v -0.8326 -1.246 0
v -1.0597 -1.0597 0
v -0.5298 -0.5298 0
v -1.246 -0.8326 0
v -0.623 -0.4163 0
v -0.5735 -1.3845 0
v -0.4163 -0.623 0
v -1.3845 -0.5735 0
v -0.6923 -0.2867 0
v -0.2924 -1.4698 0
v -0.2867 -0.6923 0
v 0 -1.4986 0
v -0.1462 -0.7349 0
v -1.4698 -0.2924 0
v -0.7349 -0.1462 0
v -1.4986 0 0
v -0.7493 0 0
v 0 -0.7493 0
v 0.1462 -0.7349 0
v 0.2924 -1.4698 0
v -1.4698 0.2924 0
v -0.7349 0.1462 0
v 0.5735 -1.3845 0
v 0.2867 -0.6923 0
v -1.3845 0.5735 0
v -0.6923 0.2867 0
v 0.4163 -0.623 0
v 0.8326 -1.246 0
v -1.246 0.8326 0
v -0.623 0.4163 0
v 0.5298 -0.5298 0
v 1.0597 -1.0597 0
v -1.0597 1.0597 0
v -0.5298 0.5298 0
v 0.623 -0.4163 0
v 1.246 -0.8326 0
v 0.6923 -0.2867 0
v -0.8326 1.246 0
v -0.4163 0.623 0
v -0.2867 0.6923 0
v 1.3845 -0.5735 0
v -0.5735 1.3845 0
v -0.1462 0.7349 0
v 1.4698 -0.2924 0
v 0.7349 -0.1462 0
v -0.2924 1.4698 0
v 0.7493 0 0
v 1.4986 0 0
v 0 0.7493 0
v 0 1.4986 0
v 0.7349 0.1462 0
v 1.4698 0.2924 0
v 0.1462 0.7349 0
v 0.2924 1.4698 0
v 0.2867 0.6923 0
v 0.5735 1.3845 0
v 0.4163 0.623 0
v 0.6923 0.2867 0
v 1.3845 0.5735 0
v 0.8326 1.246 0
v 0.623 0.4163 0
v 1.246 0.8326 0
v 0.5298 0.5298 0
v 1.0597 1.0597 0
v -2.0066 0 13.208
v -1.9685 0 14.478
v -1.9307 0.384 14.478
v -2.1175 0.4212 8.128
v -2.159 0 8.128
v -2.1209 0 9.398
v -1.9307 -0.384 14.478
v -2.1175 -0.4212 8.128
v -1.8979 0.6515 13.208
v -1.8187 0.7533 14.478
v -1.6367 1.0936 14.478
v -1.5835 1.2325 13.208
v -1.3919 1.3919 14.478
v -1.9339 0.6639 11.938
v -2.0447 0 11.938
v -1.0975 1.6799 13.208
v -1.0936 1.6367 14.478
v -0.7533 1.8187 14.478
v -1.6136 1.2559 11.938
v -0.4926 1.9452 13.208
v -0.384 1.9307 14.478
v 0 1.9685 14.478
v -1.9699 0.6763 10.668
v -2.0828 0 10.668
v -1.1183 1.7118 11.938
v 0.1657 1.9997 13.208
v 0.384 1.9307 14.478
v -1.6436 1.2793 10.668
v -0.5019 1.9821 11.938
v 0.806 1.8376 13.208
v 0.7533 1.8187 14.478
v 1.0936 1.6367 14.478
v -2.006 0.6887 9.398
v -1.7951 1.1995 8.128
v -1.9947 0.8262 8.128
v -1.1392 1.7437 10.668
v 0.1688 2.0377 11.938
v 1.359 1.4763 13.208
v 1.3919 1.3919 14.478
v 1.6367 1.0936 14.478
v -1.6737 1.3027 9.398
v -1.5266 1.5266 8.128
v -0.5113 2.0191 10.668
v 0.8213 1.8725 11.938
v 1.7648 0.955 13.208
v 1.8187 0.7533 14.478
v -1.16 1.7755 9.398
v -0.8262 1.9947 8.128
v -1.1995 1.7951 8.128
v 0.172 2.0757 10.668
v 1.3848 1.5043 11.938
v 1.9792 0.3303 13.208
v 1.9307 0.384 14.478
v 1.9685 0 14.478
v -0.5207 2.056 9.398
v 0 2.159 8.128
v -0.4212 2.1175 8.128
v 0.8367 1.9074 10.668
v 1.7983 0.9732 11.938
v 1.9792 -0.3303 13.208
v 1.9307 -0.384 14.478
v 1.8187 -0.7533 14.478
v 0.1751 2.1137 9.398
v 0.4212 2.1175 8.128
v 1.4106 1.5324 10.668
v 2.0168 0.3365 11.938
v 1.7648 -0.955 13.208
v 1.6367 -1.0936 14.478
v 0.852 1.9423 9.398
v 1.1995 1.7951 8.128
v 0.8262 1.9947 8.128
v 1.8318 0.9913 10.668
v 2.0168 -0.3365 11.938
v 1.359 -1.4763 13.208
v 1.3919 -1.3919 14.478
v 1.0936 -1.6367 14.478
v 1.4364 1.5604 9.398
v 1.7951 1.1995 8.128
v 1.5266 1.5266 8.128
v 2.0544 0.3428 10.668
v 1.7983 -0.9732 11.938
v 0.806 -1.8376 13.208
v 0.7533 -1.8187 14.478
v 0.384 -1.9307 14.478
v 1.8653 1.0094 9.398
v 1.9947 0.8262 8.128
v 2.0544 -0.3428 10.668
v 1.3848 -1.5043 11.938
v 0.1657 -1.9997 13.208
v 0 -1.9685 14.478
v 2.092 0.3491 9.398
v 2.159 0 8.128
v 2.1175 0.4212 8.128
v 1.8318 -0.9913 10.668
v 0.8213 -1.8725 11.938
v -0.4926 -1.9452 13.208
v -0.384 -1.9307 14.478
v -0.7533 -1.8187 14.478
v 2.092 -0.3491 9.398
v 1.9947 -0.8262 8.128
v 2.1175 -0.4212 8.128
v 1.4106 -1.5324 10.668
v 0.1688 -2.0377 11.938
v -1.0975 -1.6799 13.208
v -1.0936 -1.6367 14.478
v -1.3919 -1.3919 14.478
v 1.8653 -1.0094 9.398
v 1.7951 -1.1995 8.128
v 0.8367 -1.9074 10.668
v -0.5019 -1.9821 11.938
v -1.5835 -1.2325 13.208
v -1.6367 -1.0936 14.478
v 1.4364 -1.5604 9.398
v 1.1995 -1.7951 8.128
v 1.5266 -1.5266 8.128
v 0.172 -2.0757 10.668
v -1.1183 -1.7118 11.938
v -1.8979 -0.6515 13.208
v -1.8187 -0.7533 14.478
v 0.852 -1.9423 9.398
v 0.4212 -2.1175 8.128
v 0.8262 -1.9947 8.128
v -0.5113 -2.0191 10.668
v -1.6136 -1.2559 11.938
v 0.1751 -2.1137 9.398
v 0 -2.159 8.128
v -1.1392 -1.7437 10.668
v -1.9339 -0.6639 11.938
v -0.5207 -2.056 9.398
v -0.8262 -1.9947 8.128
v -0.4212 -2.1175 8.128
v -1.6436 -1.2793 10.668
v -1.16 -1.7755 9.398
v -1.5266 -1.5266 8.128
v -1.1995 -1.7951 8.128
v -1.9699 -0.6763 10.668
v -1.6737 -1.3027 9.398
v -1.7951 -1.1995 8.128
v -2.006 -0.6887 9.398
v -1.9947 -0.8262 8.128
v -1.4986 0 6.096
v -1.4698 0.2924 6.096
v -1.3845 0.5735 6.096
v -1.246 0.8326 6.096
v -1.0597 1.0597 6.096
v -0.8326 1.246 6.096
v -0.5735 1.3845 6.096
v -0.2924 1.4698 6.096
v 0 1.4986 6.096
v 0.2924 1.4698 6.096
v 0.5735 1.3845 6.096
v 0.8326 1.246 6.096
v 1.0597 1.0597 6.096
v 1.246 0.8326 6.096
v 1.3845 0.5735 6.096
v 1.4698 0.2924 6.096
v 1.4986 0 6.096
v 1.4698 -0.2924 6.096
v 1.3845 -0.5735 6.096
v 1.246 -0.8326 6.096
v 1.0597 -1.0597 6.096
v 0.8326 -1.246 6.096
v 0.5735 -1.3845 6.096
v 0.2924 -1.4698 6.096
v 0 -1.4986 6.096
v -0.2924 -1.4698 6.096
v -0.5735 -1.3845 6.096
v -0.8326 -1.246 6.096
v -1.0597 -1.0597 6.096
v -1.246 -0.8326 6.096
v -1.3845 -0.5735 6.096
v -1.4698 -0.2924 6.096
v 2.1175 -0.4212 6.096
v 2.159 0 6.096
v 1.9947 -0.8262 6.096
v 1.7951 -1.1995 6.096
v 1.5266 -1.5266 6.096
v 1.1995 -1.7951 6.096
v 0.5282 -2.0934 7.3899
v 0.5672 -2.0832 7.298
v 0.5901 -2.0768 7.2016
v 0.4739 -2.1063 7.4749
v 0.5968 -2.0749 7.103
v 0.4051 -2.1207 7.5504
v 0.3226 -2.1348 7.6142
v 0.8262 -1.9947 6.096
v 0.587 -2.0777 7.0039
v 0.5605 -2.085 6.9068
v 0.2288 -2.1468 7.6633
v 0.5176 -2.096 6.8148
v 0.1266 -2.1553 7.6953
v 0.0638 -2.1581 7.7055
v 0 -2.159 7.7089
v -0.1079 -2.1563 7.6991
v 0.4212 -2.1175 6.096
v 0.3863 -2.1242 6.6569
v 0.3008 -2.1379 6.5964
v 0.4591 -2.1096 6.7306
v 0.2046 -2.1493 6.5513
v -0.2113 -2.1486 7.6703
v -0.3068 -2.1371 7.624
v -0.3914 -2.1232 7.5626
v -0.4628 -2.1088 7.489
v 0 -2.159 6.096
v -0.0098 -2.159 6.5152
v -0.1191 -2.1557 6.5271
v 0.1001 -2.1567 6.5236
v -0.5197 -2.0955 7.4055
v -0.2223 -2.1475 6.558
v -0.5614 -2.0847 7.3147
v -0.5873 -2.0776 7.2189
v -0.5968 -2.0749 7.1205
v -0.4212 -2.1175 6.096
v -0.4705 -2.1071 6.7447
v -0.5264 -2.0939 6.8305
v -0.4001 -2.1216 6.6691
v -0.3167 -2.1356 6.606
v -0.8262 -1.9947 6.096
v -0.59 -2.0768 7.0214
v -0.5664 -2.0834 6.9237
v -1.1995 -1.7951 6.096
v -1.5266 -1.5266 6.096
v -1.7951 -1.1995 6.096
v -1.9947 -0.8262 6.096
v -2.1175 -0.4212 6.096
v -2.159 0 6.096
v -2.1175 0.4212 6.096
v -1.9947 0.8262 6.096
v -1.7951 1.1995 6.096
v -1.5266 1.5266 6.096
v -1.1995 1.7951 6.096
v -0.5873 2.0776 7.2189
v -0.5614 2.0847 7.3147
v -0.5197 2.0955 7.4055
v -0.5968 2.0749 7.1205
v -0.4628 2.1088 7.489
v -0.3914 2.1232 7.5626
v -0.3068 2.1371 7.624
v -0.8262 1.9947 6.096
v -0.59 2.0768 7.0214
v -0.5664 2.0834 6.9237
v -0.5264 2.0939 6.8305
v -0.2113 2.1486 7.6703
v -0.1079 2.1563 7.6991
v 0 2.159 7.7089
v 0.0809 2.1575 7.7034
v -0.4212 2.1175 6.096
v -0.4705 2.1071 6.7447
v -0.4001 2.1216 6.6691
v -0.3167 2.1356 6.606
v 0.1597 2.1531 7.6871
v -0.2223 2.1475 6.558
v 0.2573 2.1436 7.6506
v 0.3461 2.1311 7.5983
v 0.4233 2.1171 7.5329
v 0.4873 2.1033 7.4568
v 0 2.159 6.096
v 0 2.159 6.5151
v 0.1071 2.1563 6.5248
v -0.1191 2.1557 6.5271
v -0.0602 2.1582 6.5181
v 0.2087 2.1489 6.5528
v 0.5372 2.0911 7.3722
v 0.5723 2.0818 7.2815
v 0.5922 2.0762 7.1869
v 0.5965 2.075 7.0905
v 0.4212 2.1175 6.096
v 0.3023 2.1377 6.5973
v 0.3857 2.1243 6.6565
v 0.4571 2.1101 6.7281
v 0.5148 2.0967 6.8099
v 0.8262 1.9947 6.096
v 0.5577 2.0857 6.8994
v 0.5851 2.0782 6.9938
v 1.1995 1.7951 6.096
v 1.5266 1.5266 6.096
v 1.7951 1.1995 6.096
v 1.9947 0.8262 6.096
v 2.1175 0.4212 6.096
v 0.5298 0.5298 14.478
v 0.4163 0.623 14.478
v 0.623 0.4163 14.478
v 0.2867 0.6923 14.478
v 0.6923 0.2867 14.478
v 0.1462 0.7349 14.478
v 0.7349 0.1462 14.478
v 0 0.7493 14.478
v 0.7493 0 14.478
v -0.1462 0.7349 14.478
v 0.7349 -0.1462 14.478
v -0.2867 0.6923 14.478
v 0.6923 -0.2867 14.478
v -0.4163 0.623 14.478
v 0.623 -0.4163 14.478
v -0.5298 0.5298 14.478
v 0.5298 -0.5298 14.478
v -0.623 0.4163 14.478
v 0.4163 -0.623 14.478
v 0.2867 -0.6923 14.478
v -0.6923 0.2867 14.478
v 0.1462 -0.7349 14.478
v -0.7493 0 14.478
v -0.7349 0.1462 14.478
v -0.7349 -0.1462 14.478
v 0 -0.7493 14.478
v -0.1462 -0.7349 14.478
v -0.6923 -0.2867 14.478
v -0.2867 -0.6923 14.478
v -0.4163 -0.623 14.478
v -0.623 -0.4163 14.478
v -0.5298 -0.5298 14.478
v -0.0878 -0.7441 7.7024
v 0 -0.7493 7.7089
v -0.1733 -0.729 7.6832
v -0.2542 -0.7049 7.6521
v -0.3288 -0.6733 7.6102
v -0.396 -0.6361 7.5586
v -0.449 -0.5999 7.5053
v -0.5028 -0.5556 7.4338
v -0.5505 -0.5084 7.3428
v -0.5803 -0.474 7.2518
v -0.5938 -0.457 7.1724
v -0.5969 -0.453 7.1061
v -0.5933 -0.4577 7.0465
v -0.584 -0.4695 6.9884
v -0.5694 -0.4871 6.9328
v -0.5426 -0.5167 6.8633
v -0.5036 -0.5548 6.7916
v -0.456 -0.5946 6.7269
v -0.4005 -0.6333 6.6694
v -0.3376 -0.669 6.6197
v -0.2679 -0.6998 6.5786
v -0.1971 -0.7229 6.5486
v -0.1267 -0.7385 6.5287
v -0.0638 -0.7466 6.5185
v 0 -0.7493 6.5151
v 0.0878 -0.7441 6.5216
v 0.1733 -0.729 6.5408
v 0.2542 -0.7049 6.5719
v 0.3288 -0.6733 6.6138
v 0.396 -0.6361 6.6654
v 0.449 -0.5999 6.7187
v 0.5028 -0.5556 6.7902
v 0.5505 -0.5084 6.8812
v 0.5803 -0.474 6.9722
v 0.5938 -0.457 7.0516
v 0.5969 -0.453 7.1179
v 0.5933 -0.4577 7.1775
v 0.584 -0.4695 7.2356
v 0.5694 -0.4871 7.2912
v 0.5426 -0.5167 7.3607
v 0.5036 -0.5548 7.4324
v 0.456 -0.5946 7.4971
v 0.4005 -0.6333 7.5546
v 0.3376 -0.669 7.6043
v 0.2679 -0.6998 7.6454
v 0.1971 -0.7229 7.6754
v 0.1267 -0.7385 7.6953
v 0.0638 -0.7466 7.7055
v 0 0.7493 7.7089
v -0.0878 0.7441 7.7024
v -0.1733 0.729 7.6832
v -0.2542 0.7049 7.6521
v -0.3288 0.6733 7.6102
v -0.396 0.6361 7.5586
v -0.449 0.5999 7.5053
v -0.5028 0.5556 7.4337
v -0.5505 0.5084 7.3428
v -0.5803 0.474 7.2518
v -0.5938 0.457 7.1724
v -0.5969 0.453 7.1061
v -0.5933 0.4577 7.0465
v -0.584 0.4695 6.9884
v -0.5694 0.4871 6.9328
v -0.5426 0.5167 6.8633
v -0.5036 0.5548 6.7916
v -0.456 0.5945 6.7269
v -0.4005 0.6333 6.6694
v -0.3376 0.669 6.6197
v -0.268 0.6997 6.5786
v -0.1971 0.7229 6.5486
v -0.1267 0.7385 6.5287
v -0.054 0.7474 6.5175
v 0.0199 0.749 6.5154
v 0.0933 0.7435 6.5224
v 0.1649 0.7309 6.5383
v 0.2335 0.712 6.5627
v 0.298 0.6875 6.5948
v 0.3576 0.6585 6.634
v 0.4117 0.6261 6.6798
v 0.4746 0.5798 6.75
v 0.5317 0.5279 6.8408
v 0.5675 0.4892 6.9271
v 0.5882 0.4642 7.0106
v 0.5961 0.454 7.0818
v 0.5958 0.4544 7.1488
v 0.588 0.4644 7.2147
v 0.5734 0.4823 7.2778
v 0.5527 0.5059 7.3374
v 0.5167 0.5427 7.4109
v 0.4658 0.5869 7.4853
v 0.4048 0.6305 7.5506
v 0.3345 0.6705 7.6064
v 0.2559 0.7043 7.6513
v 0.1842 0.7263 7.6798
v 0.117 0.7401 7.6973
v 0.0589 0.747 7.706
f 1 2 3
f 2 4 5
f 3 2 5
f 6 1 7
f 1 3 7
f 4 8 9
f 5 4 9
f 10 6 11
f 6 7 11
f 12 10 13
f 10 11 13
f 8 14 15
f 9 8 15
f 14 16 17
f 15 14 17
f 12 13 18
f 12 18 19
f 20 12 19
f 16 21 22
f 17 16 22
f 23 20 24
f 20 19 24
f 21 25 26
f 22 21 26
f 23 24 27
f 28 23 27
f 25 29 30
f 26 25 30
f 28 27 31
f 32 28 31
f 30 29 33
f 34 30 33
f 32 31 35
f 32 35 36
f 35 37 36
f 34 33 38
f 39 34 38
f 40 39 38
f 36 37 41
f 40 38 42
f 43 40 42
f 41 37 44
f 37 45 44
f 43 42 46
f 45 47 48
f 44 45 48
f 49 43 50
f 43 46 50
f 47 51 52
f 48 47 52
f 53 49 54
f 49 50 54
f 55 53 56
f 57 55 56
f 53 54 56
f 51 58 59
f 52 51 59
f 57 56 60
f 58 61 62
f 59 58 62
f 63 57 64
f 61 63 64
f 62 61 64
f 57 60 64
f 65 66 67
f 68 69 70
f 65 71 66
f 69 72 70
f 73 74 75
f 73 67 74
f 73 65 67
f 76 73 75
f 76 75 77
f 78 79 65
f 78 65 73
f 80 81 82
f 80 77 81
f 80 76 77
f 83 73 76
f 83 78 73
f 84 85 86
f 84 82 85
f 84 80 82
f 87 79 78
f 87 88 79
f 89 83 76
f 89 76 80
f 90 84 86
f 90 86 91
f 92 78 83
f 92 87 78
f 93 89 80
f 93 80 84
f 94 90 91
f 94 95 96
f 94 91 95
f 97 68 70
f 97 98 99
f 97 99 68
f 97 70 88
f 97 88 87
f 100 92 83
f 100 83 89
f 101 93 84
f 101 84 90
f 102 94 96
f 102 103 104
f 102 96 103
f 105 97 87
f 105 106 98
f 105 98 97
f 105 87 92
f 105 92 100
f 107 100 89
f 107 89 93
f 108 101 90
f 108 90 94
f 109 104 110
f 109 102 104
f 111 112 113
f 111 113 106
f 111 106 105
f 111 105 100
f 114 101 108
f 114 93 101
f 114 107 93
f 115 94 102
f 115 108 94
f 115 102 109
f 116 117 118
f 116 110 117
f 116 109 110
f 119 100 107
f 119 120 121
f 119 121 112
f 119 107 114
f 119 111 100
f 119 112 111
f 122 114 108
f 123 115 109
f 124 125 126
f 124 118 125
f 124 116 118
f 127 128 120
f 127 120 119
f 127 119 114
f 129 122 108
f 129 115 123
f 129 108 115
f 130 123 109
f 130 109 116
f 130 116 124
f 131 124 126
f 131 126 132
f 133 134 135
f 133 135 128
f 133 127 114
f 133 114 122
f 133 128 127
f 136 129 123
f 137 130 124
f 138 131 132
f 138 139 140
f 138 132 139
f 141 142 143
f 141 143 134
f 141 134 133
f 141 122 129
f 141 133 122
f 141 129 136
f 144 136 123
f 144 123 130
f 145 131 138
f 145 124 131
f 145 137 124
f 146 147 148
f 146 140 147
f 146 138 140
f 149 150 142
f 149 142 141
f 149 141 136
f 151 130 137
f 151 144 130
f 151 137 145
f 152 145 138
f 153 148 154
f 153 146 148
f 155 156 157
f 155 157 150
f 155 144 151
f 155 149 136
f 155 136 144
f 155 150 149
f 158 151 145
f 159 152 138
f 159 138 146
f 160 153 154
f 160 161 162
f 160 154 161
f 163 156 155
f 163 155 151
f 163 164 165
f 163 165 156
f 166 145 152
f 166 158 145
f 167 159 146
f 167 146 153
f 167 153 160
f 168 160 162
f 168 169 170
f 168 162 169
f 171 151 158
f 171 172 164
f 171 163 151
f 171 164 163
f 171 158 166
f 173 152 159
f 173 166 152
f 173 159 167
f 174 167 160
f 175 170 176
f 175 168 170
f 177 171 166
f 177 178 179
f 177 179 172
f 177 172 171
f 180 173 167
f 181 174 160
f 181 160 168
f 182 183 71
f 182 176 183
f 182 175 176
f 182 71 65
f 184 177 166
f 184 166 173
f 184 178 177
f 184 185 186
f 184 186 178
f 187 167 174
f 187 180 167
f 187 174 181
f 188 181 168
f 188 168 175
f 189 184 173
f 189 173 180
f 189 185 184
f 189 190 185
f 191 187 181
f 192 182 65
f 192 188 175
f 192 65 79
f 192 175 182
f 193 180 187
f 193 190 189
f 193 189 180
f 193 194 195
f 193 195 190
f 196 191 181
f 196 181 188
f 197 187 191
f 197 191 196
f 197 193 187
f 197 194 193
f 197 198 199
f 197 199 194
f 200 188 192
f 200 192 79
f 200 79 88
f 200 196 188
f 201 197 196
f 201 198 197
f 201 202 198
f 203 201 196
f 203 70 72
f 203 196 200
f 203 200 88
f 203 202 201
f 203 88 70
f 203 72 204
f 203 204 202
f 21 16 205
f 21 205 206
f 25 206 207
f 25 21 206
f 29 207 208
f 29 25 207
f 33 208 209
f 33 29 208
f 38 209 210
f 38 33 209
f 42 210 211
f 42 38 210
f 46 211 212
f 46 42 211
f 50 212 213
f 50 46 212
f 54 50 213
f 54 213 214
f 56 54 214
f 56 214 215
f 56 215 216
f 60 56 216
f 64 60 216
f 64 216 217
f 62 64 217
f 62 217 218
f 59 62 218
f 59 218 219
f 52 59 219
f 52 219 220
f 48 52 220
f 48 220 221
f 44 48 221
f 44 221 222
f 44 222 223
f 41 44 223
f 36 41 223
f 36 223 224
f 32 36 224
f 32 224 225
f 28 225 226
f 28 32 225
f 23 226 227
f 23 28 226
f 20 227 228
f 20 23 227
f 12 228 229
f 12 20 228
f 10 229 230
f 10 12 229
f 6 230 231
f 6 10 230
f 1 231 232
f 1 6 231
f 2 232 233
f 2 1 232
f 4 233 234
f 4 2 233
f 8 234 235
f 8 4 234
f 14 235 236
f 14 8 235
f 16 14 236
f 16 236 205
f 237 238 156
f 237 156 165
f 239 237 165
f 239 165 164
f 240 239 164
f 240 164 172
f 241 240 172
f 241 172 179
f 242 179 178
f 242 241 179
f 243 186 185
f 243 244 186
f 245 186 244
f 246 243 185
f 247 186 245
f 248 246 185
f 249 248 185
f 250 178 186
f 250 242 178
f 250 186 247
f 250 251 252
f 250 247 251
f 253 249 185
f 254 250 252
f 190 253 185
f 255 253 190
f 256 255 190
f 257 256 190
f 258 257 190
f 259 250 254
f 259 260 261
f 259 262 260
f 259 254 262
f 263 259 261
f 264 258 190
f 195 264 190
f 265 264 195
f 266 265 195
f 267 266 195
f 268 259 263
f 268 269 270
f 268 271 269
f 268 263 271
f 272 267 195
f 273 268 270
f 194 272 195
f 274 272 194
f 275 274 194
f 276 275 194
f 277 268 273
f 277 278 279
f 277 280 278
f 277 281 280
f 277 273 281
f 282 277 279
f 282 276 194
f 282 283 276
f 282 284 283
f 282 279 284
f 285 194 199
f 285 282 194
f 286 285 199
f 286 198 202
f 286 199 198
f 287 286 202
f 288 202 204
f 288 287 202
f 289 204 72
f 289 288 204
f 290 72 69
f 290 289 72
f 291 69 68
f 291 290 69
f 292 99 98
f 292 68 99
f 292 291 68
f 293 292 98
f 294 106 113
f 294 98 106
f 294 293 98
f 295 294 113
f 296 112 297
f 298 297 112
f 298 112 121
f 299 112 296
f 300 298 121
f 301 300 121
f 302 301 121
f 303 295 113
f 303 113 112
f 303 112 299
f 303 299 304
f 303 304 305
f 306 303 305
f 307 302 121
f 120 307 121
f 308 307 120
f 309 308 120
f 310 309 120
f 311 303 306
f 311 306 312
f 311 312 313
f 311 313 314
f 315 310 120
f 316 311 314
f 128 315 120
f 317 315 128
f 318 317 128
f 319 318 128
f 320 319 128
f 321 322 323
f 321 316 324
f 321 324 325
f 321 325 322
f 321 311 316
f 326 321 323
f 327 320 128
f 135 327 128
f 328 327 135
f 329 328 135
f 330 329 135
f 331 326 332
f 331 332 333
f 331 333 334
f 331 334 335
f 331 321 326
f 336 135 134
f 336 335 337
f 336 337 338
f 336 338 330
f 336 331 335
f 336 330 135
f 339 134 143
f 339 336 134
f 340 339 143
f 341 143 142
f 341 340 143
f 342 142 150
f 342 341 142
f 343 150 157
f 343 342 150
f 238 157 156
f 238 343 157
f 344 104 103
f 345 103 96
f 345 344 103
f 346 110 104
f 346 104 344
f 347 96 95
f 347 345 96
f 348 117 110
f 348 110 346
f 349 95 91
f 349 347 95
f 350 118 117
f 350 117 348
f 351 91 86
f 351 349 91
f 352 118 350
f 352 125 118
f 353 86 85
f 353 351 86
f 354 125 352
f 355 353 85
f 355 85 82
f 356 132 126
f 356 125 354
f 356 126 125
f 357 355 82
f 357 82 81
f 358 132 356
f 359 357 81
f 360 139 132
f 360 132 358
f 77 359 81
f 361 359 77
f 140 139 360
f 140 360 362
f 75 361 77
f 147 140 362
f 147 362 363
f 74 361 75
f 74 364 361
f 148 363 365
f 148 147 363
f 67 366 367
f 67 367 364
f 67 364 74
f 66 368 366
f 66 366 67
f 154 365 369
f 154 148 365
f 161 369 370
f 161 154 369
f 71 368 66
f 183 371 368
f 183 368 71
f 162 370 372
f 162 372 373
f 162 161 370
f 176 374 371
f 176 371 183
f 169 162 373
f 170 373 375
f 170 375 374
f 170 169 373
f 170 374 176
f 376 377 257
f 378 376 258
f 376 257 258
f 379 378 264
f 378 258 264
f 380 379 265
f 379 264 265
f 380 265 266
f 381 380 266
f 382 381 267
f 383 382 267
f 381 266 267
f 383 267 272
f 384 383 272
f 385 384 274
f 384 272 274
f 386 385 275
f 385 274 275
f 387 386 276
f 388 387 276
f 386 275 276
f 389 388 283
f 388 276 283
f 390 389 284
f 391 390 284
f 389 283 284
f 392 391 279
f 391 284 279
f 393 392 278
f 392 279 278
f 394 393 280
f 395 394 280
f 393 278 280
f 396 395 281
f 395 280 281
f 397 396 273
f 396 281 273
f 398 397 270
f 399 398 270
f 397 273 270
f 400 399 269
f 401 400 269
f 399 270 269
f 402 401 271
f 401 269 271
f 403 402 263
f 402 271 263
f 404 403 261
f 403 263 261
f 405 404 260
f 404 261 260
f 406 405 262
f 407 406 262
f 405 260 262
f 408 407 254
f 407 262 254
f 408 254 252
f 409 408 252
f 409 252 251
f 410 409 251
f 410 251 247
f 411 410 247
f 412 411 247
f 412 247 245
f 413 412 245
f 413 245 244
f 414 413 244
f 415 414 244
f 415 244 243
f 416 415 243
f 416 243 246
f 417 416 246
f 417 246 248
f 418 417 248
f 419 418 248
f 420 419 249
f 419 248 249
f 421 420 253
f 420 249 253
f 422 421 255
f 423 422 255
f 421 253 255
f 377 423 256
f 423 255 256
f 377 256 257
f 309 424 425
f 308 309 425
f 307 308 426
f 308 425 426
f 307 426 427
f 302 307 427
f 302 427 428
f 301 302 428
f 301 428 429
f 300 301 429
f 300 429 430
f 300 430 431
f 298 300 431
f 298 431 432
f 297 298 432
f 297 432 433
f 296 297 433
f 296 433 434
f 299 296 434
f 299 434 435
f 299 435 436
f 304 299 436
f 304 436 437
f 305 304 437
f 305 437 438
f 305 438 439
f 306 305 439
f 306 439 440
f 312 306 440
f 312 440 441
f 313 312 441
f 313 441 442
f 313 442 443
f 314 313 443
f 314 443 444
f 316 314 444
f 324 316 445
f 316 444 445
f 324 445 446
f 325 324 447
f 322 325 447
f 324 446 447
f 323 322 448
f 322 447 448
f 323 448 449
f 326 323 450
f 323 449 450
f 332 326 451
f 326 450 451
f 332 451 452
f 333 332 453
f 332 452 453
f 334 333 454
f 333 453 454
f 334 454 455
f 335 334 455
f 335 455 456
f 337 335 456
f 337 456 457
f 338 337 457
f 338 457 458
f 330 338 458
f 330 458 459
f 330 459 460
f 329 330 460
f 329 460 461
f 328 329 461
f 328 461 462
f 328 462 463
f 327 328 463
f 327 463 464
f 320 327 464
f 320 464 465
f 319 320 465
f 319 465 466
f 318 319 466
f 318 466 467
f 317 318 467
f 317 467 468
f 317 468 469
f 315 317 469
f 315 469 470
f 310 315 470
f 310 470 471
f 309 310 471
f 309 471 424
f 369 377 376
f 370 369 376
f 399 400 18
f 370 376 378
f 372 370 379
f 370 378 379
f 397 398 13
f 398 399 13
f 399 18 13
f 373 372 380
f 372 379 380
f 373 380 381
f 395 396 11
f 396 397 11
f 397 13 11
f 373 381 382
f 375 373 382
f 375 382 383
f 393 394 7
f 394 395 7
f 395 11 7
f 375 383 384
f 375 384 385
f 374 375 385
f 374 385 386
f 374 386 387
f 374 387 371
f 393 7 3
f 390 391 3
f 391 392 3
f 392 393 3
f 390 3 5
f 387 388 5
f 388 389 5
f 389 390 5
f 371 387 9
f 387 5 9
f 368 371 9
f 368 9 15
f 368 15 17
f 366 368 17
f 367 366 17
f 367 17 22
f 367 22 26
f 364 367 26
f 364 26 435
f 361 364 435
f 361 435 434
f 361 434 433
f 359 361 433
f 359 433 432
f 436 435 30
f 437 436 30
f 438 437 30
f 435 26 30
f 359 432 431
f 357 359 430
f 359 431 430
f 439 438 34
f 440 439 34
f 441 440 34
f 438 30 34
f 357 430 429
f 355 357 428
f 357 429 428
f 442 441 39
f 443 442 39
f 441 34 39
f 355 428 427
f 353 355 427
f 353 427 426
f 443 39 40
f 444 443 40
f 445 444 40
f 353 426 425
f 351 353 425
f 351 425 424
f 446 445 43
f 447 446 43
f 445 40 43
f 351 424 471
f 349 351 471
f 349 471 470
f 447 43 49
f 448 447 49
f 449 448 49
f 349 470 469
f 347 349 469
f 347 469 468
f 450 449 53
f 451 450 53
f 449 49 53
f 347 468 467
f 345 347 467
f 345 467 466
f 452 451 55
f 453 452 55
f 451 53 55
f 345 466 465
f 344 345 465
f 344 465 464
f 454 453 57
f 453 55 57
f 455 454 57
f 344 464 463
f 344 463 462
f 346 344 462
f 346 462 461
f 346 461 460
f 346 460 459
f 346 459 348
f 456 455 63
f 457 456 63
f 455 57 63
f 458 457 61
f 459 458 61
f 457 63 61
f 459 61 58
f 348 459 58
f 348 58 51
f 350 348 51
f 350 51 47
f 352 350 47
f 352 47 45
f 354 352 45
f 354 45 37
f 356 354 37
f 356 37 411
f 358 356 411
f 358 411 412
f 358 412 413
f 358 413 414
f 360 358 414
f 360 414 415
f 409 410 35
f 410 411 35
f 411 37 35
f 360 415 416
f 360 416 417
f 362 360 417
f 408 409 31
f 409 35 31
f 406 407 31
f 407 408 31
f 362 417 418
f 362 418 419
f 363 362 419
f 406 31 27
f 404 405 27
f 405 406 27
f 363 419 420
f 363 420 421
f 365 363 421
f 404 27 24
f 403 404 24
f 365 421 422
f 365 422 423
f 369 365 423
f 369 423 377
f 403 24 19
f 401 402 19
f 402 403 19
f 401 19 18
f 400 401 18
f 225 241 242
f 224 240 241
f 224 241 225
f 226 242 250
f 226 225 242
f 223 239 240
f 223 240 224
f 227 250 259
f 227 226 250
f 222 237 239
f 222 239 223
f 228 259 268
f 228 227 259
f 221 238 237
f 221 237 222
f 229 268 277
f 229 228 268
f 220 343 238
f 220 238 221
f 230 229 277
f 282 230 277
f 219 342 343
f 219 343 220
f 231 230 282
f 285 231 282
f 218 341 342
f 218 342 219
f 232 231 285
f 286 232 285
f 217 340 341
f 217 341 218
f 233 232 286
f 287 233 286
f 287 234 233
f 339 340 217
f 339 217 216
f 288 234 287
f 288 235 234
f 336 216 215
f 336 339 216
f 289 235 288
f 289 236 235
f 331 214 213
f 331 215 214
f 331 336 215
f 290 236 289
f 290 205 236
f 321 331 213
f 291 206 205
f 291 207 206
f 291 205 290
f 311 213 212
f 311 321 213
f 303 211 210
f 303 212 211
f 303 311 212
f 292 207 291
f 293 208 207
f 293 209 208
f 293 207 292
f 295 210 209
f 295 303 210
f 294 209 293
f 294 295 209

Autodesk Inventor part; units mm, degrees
ref_plane "YZ Plane" through (0, 0, 0) normal (1, 0, 0) x (0, 1, 0)
ref_plane "XY Plane" through (0, 0, 0) normal (0, 0, 1) x (1, 0, 0)
sketch "Sketch1" plane through (0, 0, 0) normal (0, 0, 1) x (1, 0, 0)
  circle A0 centre (0, 0) radius 2.159
  dimension "d0" = 4.318
extrude "Extrusion1" add sketch "Sketch1" along normal blind 8.128
sketch "Sketch2" plane through (0, 0, 0) normal (0, 0, -1) x (-1, 0, 0)
  circle A0 centre (0, 0) radius 2.159 projected
  circle A1 centre (0, 0) radius 1.4986
  dimension "d3" = 2.9972
extrude "Extrusion2" cut sketch "Sketch2" against normal blind 6.096
sketch "Sketch3" plane through (0, 0, 0) normal (0, 1, 0) x (-1, 0, 0)
  line L0 (-2.159, 8.128) -> (2.159, 8.128) projected
  line L1 (0, -2.8448) -> (0, 17.0688) projected
  line L2 (2.159, 8.128) -> (0, 8.128)
  line L3 (0, 8.128) -> (0, 14.478)
  line L4 (2.159, 6.096) -> (-2.159, 6.096) projected
  line L5 (-2.159, 8.128) -> (2.159, 8.128) projected
  line L6 (2.159, 6.096) -> (2.159, 8.128) projected
  line L7 (-1.4986, 0) -> (1.4986, 0) projected
  line L8 (0, 14.478) -> (1.9685, 14.478)
  line L9 (1.9685, 14.478) -> (2.159, 8.128)
  point P0 (0, 0)
  dimension "d22" = 8.128
  dimension "d23" = 6.096
  dimension "d24" = 6.35
  dimension "d25" = 1.9685
revolve "Revolution1" add sketch "Sketch3" angle 360 about axis through (0, 0, -10) along (0, 0, 1) contours L1 L8 L9 L0
hole "Hole1" at (0, 0, 14.478) direction (0, 0, -1) diameter 1.4986 end through all
ref_plane "Work Plane1" through (0, 2.159, 0) normal (0, 1, 0) x (-1, 0, 0)
sketch "Sketch5" plane through (0, 2.159, 0) normal (0, 1, 0) x (-1, 0, 0)
  line L0 (2.159, 6.096) -> (-2.159, 6.096) projected
  line L1 (-2.159, 8.128) -> (2.159, 8.128) projected
  line L2 (0, -2.8956) -> (0, 17.3736) projected
  line L3 (0, 8.128) -> (0, 6.096)
  point P0 (0, 0)
  point P1 (0, 7.112)
hole "Hole2" at (0, 2.159, 7.112) direction (0, -1, 0) diameter 1.1938 end through all
equation "\"d25\" = 0.5 * d0 - 0.03 * d6"
equation "\"d6\" = 6.35"
properties part number "Tool_Mount_Luer_Adapter_Original" material "Acetal Resin, White"
